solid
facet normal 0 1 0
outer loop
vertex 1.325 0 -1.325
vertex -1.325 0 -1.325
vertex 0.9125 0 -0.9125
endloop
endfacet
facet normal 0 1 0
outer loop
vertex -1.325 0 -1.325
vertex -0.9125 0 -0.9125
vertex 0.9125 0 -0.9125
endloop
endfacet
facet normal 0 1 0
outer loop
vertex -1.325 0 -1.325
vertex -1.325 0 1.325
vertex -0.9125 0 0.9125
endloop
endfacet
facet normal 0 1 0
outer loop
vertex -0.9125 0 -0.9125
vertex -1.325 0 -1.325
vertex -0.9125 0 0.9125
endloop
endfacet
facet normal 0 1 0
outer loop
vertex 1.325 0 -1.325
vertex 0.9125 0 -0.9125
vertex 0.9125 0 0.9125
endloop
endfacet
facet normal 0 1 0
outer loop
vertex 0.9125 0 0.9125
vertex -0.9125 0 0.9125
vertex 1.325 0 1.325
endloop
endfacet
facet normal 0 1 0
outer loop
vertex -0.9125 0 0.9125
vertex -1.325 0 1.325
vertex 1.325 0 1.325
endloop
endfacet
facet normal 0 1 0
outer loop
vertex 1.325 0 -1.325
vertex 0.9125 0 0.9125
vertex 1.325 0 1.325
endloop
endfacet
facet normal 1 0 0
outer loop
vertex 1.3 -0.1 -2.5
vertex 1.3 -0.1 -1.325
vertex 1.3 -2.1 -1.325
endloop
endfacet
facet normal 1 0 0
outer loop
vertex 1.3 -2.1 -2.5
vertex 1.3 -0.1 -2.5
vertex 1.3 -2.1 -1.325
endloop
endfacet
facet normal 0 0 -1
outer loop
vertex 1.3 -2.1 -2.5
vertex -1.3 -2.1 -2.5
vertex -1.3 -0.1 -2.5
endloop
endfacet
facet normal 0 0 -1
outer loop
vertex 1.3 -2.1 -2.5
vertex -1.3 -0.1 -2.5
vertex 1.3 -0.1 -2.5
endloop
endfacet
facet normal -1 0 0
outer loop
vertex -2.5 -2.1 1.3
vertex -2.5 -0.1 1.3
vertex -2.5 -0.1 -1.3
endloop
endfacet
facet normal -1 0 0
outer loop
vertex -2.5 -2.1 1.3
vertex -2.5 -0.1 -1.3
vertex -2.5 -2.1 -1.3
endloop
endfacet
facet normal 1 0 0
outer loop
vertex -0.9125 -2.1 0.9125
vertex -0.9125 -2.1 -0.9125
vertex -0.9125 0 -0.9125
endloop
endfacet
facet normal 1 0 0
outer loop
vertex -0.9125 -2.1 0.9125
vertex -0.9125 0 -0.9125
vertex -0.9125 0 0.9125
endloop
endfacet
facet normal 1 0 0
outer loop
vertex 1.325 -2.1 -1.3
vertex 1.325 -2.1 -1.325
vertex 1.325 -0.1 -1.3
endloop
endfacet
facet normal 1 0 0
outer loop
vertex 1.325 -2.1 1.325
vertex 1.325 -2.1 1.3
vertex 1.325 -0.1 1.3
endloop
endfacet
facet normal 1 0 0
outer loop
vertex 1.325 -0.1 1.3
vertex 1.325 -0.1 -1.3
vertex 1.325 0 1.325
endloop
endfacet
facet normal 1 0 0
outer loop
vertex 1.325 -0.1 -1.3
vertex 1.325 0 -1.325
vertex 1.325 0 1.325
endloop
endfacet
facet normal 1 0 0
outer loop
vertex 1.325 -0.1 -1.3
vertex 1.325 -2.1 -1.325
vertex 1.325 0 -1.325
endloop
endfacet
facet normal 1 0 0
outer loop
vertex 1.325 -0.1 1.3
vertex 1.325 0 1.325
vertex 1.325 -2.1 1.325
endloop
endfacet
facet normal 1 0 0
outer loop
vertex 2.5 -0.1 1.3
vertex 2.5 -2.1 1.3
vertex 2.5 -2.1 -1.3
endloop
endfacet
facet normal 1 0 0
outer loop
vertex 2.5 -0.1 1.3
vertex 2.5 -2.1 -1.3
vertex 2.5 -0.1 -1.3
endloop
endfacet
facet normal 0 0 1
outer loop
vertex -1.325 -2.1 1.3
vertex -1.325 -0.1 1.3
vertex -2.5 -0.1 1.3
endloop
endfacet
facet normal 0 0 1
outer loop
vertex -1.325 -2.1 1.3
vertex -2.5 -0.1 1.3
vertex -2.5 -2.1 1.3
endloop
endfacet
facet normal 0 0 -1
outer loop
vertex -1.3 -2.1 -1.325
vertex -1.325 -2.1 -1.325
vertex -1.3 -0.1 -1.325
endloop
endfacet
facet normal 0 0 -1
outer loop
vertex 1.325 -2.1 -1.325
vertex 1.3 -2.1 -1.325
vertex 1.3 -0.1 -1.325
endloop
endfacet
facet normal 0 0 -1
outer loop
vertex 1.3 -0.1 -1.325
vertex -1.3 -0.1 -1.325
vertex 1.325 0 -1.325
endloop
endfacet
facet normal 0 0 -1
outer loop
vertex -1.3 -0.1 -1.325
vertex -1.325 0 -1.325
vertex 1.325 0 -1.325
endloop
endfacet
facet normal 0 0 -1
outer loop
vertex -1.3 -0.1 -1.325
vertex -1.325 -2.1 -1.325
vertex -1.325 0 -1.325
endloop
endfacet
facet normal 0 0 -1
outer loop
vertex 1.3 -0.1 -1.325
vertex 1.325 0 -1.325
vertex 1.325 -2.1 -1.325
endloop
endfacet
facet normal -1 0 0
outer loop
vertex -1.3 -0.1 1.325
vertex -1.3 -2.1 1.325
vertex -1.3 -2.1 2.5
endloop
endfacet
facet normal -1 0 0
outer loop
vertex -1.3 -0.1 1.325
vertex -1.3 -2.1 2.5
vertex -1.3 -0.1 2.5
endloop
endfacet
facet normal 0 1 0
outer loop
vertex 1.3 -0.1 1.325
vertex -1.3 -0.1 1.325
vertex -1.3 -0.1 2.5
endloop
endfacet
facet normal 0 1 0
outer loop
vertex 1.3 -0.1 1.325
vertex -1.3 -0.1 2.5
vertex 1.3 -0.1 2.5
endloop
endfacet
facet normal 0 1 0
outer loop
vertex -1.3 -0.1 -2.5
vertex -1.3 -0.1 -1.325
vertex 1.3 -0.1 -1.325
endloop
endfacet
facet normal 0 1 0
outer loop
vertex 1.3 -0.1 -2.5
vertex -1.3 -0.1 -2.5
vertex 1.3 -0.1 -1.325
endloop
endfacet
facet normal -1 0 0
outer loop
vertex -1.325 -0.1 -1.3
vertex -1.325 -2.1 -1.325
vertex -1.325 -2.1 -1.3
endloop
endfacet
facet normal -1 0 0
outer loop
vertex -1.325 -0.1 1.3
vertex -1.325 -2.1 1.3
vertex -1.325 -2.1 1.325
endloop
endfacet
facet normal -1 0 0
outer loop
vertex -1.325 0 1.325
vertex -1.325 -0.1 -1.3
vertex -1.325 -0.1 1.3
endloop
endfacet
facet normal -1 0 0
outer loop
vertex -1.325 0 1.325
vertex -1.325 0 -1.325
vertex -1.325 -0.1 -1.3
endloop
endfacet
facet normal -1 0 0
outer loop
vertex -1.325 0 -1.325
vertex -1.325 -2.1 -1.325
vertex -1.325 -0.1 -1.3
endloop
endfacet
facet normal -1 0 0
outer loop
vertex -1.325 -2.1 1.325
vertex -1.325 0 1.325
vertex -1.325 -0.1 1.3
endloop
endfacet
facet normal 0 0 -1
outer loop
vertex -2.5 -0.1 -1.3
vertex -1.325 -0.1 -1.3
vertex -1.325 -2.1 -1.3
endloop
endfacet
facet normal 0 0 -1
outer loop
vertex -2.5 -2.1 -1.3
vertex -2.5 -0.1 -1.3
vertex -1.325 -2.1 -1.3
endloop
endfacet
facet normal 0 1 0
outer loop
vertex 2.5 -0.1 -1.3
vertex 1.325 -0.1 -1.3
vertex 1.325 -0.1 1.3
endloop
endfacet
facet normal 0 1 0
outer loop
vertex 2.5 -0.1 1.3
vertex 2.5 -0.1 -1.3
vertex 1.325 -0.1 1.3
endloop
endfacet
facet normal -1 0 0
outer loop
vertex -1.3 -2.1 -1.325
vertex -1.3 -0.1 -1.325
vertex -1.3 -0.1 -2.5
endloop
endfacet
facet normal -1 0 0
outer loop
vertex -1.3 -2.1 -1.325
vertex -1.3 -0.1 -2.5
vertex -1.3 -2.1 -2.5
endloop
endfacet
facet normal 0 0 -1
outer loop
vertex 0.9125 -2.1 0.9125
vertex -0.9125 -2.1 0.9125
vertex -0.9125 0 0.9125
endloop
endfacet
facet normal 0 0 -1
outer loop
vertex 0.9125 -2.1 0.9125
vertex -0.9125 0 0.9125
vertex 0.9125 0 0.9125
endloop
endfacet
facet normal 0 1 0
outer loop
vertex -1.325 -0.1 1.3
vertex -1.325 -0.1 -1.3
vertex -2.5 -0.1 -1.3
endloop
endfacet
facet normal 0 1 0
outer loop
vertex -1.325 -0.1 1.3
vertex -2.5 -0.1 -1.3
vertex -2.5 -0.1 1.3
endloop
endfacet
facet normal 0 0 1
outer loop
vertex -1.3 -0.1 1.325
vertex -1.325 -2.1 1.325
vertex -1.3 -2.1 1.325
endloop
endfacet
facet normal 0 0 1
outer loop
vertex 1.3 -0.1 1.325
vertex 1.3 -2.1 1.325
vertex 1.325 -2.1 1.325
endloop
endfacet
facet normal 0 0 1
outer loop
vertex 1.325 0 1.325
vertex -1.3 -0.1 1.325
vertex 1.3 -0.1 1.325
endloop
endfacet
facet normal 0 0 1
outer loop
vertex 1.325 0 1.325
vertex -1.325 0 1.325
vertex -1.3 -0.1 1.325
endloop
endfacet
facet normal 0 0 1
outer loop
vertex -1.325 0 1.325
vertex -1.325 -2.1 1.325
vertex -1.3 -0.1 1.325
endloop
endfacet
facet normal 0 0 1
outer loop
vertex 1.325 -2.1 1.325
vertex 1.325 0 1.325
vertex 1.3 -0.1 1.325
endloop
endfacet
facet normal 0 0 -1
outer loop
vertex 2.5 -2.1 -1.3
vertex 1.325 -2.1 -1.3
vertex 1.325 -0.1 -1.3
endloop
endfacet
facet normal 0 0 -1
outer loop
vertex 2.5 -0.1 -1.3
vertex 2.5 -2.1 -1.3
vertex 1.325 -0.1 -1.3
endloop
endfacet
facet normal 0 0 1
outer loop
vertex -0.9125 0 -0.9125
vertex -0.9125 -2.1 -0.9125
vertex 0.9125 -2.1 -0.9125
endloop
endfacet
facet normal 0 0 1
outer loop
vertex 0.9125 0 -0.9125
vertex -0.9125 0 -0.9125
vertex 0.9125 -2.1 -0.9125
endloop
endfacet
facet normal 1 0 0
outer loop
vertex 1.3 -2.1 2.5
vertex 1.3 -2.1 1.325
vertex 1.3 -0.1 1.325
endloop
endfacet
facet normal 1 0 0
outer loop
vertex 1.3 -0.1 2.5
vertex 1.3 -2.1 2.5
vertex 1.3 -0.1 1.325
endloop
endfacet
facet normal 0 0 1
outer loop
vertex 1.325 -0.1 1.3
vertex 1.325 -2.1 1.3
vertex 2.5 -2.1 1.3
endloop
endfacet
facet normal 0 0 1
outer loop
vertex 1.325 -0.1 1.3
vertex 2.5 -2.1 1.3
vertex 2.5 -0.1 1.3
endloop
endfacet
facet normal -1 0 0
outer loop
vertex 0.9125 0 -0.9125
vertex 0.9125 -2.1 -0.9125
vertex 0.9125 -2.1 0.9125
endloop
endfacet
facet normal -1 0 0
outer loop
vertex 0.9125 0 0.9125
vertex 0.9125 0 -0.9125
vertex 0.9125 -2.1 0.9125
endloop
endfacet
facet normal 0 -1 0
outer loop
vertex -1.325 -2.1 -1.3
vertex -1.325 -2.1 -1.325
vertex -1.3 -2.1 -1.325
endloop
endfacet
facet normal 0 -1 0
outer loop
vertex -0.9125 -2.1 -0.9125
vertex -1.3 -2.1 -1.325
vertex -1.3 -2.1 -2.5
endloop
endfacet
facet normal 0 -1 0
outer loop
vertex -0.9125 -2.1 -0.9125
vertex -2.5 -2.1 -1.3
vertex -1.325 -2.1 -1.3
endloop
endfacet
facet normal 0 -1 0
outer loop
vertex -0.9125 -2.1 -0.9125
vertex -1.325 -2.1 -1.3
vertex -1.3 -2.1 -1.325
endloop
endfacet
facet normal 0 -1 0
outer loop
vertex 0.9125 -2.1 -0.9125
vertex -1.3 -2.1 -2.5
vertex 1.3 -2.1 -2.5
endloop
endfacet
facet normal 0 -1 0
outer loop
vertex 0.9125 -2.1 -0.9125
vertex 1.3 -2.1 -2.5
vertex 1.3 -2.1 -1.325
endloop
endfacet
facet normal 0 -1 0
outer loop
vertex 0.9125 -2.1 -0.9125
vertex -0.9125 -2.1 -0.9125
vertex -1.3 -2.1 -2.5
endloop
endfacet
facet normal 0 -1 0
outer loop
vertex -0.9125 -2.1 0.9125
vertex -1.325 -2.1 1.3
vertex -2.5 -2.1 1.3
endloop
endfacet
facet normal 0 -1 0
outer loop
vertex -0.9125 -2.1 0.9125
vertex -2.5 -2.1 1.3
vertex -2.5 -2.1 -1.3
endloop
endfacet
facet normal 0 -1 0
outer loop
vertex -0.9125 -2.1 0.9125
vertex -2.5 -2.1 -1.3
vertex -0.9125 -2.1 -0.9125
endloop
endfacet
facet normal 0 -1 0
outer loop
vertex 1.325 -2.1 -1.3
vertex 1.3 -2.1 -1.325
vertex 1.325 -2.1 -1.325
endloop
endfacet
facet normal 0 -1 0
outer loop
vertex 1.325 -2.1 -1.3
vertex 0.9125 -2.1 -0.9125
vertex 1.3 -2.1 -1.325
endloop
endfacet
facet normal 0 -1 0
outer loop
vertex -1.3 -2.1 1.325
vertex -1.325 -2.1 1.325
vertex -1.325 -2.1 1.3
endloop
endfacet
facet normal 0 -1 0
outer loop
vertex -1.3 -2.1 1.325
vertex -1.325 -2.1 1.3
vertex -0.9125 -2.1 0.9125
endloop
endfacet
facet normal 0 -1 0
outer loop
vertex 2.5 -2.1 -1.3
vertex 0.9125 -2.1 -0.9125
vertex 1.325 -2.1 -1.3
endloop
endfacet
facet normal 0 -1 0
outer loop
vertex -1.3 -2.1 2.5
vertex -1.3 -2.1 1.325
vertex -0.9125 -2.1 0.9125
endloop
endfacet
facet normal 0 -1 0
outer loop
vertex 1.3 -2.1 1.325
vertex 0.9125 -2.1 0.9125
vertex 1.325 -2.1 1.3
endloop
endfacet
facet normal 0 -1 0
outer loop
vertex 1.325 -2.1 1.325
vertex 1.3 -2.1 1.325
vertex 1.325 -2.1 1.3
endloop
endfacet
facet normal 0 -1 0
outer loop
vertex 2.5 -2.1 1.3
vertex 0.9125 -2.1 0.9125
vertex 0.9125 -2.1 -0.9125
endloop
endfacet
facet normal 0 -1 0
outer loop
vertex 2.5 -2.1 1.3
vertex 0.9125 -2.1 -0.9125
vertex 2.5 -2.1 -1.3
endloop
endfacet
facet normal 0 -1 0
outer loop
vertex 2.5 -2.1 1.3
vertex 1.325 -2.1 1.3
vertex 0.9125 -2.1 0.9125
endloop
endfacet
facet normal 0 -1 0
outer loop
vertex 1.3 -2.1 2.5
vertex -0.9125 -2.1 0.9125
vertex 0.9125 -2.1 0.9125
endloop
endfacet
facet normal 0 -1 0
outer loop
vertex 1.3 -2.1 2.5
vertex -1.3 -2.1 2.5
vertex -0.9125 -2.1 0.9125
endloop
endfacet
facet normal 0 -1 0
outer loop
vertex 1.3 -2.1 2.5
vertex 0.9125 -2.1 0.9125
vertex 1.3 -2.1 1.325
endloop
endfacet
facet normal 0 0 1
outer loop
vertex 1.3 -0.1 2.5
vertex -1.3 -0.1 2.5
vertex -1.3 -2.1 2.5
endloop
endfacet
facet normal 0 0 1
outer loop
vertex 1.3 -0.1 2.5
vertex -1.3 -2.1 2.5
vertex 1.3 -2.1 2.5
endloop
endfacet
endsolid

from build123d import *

# Parameters (mm, degrees)
F0_W      = 2.65
F0_H      = 2.65
F1_DEPTH  = 2.1
F2_W      = 2.6
F2_H      = 2
F3_DEPTH  = 1.175
F4_W      = 2
F4_H      = 2.6
F5_DEPTH  = 1.175
F6_W      = 2.6
F6_H      = 2
F7_DEPTH  = 1.175
F8_W      = 2
F8_H      = 2.6
F9_DEPTH  = 1.175
F10_W     = 1.825
F10_H     = 1.825
F11_DEPTH = 2.1


with BuildPart() as f1:
    # F0 (on Front) → F1 (new body)
    with BuildSketch(Plane.XZ):
        Rectangle(F0_W, F0_H)
    extrude(amount=F1_DEPTH)

    # F2 (on face) → F3 (join)
    with BuildSketch(Plane(origin=(0, 0, -1.325), x_dir=(1, 0, 0), z_dir=(0, 0, -1))):
        with Locations((0, 1.1)):
            Rectangle(F2_W, F2_H)
    extrude(amount=F3_DEPTH)

    # F4 (on face) → F5 (join)
    with BuildSketch(Plane(origin=(-1.325, 0, 0), x_dir=(0, -1, 0), z_dir=(-1, 0, 0))):
        with Locations((1.1, 0)):
            Rectangle(F4_W, F4_H)
    extrude(amount=F5_DEPTH)

    # F6 (on face) → F7 (join)
    with BuildSketch(Plane.XY.offset(1.325)):
        with Locations((0, -1.1)):
            Rectangle(F6_W, F6_H)
    extrude(amount=F7_DEPTH)

    # F8 (on face) → F9 (join)
    with BuildSketch(Plane.YZ.offset(1.325)):
        with Locations((-1.1, 0)):
            Rectangle(F8_W, F8_H)
    extrude(amount=F9_DEPTH)

    # F10 (on face) → F11 (cut)
    with BuildSketch(Plane.XZ.offset(2.1)):
        Rectangle(F10_W, F10_H)
    extrude(amount=-F11_DEPTH, mode=Mode.SUBTRACT)


solid = f1.part
